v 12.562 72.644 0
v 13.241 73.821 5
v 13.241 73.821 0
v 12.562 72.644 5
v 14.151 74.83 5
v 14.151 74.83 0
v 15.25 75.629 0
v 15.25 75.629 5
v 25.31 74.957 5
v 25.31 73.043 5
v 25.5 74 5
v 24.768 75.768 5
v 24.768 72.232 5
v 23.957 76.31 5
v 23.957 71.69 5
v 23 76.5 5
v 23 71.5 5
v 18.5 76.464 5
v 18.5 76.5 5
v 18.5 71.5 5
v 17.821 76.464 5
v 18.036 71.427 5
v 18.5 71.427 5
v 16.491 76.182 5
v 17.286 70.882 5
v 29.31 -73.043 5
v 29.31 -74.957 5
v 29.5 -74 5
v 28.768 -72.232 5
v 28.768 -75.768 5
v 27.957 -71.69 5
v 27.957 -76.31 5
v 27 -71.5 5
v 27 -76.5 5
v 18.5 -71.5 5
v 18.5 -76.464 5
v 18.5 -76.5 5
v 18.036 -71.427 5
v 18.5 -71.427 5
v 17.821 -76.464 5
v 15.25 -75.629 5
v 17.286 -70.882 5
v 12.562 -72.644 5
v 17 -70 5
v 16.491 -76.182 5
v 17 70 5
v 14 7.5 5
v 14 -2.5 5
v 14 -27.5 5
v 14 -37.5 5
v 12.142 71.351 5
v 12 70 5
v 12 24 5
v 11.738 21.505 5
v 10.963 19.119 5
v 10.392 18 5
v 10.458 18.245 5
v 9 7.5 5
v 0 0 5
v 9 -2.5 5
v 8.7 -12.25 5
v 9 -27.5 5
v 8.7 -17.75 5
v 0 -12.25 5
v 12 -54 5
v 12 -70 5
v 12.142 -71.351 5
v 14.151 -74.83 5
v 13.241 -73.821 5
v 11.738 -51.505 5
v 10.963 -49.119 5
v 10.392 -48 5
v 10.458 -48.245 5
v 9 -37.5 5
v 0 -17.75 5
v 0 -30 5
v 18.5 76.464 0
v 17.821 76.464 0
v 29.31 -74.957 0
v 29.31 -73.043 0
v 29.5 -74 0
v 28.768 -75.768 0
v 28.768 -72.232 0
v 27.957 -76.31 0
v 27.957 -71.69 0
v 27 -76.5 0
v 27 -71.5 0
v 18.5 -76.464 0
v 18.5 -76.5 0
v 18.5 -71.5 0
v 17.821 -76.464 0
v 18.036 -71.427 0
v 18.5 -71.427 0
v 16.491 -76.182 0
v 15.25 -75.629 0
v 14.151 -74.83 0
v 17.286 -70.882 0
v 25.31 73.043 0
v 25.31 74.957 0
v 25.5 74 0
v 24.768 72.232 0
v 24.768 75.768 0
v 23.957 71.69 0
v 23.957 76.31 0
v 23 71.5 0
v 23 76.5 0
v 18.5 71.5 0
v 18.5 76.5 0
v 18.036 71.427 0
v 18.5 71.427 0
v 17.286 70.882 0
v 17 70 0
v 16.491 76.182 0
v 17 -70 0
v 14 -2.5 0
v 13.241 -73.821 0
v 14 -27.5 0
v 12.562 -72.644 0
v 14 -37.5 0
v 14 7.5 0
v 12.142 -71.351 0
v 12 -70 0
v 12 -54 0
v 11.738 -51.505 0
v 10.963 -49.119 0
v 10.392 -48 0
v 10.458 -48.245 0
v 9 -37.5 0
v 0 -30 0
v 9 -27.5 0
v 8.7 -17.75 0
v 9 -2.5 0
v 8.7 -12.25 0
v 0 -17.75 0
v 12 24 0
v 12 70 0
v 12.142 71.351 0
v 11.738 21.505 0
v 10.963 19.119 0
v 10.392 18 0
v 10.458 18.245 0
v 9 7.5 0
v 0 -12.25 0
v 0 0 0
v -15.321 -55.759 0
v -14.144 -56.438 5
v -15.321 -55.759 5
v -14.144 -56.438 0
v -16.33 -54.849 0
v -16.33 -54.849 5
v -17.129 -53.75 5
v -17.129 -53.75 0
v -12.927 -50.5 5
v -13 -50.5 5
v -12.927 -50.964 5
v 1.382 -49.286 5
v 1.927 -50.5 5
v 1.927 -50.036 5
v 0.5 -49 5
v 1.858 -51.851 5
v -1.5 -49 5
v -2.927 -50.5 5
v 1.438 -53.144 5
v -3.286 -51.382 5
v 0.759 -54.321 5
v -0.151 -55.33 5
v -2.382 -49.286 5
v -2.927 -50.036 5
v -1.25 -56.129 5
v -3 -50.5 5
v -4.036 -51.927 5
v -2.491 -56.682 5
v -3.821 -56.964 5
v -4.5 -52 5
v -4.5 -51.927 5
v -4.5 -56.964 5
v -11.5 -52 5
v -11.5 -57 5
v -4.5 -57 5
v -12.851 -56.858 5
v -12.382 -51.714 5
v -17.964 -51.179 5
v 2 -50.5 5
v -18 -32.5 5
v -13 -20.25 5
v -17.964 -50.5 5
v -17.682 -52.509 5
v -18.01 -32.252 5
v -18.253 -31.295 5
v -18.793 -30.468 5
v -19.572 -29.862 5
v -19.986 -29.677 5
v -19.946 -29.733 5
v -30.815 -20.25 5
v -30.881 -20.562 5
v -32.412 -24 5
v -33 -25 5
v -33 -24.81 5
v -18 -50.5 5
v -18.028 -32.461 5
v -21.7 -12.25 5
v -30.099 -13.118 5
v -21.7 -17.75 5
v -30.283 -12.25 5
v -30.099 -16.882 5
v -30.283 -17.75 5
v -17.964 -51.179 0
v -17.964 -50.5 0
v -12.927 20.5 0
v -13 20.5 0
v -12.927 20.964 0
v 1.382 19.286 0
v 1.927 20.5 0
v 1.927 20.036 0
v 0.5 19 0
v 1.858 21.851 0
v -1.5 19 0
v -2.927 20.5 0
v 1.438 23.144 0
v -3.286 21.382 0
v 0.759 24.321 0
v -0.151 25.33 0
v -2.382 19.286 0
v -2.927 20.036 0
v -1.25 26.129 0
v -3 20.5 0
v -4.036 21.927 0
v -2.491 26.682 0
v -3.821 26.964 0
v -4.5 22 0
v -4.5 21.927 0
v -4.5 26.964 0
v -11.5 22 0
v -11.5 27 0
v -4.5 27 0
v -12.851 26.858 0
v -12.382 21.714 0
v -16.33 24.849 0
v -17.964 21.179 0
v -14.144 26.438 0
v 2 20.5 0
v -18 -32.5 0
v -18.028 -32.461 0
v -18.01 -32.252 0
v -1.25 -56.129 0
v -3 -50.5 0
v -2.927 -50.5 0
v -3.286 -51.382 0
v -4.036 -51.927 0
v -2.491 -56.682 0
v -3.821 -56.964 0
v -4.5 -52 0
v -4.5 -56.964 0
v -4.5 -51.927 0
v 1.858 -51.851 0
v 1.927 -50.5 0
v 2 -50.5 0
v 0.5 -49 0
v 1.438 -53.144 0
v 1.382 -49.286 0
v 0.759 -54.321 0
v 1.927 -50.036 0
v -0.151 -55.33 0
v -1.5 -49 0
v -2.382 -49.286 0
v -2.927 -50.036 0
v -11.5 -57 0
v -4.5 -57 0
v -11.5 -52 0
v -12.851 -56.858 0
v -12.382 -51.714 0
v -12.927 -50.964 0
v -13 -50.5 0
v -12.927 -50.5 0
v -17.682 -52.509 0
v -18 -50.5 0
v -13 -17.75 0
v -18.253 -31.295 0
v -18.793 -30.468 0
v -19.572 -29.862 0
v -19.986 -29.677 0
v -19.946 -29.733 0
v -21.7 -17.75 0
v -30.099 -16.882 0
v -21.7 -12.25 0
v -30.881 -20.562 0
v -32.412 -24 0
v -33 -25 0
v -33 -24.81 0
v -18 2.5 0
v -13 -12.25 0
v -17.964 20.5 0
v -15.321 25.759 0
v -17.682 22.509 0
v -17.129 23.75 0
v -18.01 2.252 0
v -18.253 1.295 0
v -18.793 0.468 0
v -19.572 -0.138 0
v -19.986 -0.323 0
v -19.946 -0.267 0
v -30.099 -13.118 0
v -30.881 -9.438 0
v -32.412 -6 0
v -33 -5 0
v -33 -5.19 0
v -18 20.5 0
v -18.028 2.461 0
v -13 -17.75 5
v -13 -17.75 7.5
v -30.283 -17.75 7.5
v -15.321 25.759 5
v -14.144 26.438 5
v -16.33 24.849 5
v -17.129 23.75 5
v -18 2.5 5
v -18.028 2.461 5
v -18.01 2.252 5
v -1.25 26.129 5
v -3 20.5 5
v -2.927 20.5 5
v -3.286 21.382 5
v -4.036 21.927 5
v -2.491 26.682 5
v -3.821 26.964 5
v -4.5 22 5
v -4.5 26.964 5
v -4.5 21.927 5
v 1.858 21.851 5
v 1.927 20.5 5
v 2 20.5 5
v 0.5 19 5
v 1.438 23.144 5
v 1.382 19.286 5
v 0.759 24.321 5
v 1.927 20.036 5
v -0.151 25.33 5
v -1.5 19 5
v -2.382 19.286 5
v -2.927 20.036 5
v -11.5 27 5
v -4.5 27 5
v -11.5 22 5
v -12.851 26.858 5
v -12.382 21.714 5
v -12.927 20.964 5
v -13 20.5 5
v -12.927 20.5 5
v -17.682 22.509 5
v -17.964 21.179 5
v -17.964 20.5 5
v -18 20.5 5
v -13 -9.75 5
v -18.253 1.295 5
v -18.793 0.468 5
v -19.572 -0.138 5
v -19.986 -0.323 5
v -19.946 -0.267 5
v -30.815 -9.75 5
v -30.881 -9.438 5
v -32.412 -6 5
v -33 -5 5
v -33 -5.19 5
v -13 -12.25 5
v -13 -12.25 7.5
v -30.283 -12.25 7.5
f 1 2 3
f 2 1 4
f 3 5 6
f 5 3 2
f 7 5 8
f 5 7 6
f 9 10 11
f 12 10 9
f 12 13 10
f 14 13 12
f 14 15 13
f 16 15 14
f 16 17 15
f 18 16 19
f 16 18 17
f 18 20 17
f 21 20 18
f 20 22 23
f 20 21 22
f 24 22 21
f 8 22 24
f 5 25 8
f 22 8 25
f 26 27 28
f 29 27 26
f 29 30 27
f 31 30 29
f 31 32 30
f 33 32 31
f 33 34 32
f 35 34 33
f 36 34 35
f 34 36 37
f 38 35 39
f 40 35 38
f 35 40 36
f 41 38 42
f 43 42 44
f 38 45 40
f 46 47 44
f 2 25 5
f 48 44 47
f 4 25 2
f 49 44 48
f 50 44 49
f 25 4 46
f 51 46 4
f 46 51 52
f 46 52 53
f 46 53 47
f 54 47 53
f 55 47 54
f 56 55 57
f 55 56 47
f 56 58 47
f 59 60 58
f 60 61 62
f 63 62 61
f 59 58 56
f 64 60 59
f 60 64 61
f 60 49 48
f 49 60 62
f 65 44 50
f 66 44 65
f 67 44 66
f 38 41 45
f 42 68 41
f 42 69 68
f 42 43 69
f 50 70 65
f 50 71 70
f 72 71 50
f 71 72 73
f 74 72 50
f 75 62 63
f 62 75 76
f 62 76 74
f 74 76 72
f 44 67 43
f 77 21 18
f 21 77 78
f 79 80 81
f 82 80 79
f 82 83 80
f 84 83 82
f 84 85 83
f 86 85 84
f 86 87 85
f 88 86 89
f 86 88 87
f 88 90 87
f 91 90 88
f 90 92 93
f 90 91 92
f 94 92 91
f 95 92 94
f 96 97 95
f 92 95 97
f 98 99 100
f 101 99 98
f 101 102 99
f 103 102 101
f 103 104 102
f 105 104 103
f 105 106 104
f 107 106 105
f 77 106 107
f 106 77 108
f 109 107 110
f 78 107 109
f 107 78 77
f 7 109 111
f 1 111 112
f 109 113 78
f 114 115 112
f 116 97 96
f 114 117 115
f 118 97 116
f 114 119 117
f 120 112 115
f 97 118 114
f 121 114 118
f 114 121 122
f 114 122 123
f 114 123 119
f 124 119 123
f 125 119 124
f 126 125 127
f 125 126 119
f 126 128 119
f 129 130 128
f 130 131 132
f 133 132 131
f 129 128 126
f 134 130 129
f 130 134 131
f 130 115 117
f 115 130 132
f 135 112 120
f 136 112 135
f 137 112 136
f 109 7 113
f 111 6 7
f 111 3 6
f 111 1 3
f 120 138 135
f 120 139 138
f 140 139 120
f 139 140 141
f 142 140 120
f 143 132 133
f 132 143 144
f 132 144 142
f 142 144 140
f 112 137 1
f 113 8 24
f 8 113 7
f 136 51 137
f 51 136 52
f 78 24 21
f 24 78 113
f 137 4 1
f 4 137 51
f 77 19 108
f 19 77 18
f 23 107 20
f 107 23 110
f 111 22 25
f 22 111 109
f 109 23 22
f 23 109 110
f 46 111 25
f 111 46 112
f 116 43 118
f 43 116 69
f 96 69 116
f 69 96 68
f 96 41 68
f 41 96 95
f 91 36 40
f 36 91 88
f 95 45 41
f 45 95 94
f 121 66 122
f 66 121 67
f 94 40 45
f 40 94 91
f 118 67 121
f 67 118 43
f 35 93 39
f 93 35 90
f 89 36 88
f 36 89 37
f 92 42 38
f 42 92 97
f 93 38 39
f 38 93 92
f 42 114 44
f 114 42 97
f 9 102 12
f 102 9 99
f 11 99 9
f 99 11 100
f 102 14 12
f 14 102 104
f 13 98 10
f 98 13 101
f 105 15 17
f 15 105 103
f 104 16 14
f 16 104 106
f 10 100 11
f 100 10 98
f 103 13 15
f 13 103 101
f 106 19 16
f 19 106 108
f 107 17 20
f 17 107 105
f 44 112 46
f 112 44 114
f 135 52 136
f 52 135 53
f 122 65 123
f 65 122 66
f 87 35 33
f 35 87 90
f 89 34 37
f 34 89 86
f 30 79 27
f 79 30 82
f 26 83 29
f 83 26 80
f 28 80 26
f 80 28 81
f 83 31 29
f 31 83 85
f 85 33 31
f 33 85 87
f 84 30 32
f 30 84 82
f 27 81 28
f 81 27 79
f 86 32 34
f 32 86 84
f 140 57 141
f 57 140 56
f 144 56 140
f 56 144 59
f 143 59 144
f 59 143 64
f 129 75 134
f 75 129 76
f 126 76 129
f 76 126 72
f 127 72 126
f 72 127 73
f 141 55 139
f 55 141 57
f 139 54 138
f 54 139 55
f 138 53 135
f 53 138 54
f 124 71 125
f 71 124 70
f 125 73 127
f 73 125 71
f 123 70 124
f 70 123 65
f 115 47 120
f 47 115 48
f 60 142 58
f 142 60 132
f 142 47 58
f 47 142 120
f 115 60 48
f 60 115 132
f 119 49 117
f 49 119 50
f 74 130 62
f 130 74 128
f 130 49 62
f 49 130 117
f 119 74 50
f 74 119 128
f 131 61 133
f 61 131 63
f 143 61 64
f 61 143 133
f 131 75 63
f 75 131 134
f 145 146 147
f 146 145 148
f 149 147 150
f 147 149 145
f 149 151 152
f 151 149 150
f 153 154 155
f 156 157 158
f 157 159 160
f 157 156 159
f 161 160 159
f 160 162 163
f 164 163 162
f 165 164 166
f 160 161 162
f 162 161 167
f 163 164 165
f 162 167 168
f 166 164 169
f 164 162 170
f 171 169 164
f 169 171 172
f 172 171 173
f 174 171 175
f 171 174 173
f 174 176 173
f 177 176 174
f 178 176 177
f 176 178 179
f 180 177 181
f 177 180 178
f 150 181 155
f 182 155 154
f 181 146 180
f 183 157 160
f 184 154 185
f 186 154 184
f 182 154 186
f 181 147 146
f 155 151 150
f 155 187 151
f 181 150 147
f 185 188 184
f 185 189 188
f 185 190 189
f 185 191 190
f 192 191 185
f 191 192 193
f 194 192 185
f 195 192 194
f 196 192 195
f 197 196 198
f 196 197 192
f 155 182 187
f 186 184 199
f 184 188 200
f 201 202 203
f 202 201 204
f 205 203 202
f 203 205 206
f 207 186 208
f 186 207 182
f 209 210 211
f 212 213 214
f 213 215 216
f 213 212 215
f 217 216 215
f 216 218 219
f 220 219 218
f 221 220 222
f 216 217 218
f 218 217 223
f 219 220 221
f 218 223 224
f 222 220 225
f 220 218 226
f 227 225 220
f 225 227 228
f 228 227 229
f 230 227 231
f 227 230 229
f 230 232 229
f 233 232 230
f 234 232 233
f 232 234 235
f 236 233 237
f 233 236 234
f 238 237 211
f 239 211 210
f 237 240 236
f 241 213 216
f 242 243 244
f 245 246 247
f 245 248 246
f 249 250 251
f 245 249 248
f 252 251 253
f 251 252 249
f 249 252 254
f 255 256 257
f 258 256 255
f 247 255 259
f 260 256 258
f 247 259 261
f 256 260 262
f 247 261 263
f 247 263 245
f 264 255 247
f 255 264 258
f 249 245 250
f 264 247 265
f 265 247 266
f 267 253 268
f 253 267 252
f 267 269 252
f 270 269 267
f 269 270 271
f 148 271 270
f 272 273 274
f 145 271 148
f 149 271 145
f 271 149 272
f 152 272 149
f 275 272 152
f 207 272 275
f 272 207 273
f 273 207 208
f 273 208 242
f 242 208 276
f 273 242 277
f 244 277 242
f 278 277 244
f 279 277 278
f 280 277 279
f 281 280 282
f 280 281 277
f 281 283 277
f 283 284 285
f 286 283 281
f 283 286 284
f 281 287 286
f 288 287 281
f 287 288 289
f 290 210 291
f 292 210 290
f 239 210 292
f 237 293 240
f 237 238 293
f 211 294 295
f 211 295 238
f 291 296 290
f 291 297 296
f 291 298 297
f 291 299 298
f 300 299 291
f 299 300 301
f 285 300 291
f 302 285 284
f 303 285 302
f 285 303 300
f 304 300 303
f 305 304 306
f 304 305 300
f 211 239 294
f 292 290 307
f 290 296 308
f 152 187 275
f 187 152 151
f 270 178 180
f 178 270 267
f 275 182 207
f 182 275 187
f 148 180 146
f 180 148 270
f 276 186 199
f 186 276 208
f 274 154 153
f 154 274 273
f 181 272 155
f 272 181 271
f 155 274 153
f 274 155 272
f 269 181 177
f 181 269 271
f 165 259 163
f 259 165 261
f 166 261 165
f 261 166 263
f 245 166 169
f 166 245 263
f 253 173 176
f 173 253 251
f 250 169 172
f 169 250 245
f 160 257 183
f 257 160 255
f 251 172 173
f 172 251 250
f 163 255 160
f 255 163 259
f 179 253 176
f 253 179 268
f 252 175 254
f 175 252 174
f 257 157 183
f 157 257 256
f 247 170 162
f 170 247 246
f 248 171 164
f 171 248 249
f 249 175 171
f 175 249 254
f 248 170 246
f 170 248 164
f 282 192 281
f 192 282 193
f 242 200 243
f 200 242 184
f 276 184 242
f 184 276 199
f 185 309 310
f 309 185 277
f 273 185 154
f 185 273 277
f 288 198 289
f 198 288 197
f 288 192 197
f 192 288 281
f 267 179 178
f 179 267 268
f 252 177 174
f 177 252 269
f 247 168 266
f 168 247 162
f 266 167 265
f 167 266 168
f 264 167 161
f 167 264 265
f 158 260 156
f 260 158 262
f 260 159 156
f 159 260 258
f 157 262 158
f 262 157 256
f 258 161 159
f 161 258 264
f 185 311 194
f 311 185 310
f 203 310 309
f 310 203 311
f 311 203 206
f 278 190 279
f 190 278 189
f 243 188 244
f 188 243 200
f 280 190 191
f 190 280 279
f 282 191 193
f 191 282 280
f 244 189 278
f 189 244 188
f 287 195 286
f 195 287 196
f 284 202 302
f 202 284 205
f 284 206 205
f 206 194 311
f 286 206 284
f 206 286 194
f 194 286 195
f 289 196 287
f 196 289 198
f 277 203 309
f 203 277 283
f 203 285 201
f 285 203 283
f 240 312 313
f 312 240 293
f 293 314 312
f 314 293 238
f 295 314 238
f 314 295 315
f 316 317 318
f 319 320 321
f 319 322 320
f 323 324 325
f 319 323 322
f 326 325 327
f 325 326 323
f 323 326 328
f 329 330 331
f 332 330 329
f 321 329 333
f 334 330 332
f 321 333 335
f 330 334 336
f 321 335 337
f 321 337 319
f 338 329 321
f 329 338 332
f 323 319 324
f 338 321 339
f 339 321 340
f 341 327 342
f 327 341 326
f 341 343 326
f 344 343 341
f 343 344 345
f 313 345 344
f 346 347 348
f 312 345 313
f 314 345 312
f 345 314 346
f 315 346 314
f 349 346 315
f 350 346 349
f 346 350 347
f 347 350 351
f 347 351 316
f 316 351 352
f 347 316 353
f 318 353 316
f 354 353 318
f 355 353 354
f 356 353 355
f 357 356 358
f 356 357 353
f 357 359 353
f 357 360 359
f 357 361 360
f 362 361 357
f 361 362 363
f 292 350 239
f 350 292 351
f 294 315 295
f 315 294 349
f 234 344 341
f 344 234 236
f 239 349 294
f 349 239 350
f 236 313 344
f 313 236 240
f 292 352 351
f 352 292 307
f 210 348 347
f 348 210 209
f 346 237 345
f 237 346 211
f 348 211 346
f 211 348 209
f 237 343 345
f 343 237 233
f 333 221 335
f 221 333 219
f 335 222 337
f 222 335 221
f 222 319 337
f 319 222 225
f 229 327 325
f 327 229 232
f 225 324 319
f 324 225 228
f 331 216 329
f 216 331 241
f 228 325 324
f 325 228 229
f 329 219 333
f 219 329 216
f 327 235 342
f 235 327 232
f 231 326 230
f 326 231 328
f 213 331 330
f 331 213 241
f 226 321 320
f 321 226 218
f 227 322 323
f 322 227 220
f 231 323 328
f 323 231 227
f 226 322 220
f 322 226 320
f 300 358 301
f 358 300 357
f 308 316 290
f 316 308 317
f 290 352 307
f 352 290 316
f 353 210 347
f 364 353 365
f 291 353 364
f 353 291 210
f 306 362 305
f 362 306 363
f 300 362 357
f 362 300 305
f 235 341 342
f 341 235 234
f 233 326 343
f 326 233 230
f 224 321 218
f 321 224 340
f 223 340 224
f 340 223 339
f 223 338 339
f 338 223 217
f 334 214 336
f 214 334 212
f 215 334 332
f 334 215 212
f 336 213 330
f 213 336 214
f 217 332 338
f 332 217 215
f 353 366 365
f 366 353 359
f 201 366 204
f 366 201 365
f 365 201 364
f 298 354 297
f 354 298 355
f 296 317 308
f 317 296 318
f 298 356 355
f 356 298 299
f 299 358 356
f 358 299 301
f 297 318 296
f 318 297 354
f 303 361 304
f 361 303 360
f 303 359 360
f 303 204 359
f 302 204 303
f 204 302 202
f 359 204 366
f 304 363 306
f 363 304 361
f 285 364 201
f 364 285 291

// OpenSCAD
// Depending on your printer, you should add an extra 1 to 2 mm.
Phone_Length=143;
// Depending on your printer, you should add an extra 1 to 2 mm.
Phone_Width=74;
// Depending on your printer, you should add an extra 1 to 2 mm.
Phone_Thickness = 10;

// Diameter of the bar where the holder is to be mounted.
Handle_Bar_Diameter = 36;
// Distance from the handle bar to the back of the phone. A smaller number will give a lower profile.
Holder_Height = 17; // [11:17]
// Offset from the center on the vertical part
Vertical_Offset = -15;

/* [Hidden] */
$fs = 1;

module copy_mirror(vec=[0,1,0]) {
 union() {
  children();
  mirror(vec) children();
 }
};

module rounded_corner(vec=[0,0,0],rot=0) {
 translate(vec) rotate([0,0,rot]) difference(){
  intersection(){
   cylinder(r=6.5,h=5);
   translate([-6.5,0,0]) cube([6.5,6.5,5]);
  };
  cylinder(r=1.5,h=5);
 };
};

// Vertical Piece
//translate([2.5,0,0]) rotate([0,-90,0]) difference(){
difference(){
 union(){
  translate([23,Phone_Length/2+2.5,0]) cylinder(r=2.5,h=5);
  translate([18.5,Phone_Length/2,0]) cube([4.5,5,5]);
  copy_mirror([0,1,0]) rounded_corner([18.5,Phone_Length/2-1.5,0]);
  translate([12,-Phone_Length/2+1.5,0]) cube([5,Phone_Length-3,5]);
  translate([18.5,-Phone_Length/2-5,0]) cube([Phone_Thickness-1.5,5,5]);
  translate([17+Phone_Thickness,-Phone_Length/2-2.5,0]) cylinder(r=2.5,h=5);
  linear_extrude(height=5) polygon([[12,-39+Vertical_Offset],[12,39+Vertical_Offset],[10.3923,33+Vertical_Offset],[0,15+Vertical_Offset],[0,-15+Vertical_Offset],[10.3923,-33+Vertical_Offset]]);
 };
 translate([0, Vertical_Offset, 0]) copy_mirror([0,1,0]) translate([0,39,0]) cylinder(r=12,h=5);
 translate([0, Vertical_Offset, 0]) copy_mirror([0,1,0]) translate([9,12.5,0]) cube([5,10,5]);
 translate([17-Holder_Height,-5.5/2 + Vertical_Offset,0]) cube([Holder_Height/2+0.2,5.5,5]);
 translate([-Holder_Height,-30,0]) cube([17,60,5]);
};

// Horizontal Piece
//translate([0,2.5,0]) rotate([90,0,0]) copy_mirror([1,0,0]) difference(){
translate([-30,Vertical_Offset,0]) rotate([0,0,-90]) copy_mirror([1,0,0]) difference(){
 union(){
  linear_extrude(height=5) polygon([[0,-3],[10,-3],[14.6768,10.0145],[17.5,12],[Phone_Width/2-1.5,12],[Phone_Width/2-1.5,17],[0,17]]);
  rounded_corner([Phone_Width/2-1.5,18.5,0],180);
  translate([Phone_Width/2,18.5,0]) cube([5,Phone_Thickness-3,5]);
  rounded_corner([Phone_Width/2-1.5,17+Phone_Thickness-1.5,0],-90);
  translate([Phone_Width/2-1.5,17+Phone_Thickness+1.5,0]) cylinder(r=1.5,h=5);
  translate([Phone_Width/2-1.5,17+Phone_Thickness+5-1.5,0]) cylinder(r=1.5,h=5);
  translate([Phone_Width/2-3,17+Phone_Thickness+1.5,0]) cube([1.5,2,5]);
  translate([5.5/2,17,5/2]) rotate([90,0,0]) linear_extrude(height=20) polygon([[0,0],[5,0],[0,5]]);
 };
 translate([17.5,9,0]) cylinder(r=3,h=5);
 translate([0,-Handle_Bar_Diameter/2-Holder_Height+17,0]) cylinder(r=Handle_Bar_Diameter/2,h=10);
 translate([-5.5/2,17-(Holder_Height/2+0.2),0]) cube([5.5,Holder_Height/2+0.2,5]);
};
